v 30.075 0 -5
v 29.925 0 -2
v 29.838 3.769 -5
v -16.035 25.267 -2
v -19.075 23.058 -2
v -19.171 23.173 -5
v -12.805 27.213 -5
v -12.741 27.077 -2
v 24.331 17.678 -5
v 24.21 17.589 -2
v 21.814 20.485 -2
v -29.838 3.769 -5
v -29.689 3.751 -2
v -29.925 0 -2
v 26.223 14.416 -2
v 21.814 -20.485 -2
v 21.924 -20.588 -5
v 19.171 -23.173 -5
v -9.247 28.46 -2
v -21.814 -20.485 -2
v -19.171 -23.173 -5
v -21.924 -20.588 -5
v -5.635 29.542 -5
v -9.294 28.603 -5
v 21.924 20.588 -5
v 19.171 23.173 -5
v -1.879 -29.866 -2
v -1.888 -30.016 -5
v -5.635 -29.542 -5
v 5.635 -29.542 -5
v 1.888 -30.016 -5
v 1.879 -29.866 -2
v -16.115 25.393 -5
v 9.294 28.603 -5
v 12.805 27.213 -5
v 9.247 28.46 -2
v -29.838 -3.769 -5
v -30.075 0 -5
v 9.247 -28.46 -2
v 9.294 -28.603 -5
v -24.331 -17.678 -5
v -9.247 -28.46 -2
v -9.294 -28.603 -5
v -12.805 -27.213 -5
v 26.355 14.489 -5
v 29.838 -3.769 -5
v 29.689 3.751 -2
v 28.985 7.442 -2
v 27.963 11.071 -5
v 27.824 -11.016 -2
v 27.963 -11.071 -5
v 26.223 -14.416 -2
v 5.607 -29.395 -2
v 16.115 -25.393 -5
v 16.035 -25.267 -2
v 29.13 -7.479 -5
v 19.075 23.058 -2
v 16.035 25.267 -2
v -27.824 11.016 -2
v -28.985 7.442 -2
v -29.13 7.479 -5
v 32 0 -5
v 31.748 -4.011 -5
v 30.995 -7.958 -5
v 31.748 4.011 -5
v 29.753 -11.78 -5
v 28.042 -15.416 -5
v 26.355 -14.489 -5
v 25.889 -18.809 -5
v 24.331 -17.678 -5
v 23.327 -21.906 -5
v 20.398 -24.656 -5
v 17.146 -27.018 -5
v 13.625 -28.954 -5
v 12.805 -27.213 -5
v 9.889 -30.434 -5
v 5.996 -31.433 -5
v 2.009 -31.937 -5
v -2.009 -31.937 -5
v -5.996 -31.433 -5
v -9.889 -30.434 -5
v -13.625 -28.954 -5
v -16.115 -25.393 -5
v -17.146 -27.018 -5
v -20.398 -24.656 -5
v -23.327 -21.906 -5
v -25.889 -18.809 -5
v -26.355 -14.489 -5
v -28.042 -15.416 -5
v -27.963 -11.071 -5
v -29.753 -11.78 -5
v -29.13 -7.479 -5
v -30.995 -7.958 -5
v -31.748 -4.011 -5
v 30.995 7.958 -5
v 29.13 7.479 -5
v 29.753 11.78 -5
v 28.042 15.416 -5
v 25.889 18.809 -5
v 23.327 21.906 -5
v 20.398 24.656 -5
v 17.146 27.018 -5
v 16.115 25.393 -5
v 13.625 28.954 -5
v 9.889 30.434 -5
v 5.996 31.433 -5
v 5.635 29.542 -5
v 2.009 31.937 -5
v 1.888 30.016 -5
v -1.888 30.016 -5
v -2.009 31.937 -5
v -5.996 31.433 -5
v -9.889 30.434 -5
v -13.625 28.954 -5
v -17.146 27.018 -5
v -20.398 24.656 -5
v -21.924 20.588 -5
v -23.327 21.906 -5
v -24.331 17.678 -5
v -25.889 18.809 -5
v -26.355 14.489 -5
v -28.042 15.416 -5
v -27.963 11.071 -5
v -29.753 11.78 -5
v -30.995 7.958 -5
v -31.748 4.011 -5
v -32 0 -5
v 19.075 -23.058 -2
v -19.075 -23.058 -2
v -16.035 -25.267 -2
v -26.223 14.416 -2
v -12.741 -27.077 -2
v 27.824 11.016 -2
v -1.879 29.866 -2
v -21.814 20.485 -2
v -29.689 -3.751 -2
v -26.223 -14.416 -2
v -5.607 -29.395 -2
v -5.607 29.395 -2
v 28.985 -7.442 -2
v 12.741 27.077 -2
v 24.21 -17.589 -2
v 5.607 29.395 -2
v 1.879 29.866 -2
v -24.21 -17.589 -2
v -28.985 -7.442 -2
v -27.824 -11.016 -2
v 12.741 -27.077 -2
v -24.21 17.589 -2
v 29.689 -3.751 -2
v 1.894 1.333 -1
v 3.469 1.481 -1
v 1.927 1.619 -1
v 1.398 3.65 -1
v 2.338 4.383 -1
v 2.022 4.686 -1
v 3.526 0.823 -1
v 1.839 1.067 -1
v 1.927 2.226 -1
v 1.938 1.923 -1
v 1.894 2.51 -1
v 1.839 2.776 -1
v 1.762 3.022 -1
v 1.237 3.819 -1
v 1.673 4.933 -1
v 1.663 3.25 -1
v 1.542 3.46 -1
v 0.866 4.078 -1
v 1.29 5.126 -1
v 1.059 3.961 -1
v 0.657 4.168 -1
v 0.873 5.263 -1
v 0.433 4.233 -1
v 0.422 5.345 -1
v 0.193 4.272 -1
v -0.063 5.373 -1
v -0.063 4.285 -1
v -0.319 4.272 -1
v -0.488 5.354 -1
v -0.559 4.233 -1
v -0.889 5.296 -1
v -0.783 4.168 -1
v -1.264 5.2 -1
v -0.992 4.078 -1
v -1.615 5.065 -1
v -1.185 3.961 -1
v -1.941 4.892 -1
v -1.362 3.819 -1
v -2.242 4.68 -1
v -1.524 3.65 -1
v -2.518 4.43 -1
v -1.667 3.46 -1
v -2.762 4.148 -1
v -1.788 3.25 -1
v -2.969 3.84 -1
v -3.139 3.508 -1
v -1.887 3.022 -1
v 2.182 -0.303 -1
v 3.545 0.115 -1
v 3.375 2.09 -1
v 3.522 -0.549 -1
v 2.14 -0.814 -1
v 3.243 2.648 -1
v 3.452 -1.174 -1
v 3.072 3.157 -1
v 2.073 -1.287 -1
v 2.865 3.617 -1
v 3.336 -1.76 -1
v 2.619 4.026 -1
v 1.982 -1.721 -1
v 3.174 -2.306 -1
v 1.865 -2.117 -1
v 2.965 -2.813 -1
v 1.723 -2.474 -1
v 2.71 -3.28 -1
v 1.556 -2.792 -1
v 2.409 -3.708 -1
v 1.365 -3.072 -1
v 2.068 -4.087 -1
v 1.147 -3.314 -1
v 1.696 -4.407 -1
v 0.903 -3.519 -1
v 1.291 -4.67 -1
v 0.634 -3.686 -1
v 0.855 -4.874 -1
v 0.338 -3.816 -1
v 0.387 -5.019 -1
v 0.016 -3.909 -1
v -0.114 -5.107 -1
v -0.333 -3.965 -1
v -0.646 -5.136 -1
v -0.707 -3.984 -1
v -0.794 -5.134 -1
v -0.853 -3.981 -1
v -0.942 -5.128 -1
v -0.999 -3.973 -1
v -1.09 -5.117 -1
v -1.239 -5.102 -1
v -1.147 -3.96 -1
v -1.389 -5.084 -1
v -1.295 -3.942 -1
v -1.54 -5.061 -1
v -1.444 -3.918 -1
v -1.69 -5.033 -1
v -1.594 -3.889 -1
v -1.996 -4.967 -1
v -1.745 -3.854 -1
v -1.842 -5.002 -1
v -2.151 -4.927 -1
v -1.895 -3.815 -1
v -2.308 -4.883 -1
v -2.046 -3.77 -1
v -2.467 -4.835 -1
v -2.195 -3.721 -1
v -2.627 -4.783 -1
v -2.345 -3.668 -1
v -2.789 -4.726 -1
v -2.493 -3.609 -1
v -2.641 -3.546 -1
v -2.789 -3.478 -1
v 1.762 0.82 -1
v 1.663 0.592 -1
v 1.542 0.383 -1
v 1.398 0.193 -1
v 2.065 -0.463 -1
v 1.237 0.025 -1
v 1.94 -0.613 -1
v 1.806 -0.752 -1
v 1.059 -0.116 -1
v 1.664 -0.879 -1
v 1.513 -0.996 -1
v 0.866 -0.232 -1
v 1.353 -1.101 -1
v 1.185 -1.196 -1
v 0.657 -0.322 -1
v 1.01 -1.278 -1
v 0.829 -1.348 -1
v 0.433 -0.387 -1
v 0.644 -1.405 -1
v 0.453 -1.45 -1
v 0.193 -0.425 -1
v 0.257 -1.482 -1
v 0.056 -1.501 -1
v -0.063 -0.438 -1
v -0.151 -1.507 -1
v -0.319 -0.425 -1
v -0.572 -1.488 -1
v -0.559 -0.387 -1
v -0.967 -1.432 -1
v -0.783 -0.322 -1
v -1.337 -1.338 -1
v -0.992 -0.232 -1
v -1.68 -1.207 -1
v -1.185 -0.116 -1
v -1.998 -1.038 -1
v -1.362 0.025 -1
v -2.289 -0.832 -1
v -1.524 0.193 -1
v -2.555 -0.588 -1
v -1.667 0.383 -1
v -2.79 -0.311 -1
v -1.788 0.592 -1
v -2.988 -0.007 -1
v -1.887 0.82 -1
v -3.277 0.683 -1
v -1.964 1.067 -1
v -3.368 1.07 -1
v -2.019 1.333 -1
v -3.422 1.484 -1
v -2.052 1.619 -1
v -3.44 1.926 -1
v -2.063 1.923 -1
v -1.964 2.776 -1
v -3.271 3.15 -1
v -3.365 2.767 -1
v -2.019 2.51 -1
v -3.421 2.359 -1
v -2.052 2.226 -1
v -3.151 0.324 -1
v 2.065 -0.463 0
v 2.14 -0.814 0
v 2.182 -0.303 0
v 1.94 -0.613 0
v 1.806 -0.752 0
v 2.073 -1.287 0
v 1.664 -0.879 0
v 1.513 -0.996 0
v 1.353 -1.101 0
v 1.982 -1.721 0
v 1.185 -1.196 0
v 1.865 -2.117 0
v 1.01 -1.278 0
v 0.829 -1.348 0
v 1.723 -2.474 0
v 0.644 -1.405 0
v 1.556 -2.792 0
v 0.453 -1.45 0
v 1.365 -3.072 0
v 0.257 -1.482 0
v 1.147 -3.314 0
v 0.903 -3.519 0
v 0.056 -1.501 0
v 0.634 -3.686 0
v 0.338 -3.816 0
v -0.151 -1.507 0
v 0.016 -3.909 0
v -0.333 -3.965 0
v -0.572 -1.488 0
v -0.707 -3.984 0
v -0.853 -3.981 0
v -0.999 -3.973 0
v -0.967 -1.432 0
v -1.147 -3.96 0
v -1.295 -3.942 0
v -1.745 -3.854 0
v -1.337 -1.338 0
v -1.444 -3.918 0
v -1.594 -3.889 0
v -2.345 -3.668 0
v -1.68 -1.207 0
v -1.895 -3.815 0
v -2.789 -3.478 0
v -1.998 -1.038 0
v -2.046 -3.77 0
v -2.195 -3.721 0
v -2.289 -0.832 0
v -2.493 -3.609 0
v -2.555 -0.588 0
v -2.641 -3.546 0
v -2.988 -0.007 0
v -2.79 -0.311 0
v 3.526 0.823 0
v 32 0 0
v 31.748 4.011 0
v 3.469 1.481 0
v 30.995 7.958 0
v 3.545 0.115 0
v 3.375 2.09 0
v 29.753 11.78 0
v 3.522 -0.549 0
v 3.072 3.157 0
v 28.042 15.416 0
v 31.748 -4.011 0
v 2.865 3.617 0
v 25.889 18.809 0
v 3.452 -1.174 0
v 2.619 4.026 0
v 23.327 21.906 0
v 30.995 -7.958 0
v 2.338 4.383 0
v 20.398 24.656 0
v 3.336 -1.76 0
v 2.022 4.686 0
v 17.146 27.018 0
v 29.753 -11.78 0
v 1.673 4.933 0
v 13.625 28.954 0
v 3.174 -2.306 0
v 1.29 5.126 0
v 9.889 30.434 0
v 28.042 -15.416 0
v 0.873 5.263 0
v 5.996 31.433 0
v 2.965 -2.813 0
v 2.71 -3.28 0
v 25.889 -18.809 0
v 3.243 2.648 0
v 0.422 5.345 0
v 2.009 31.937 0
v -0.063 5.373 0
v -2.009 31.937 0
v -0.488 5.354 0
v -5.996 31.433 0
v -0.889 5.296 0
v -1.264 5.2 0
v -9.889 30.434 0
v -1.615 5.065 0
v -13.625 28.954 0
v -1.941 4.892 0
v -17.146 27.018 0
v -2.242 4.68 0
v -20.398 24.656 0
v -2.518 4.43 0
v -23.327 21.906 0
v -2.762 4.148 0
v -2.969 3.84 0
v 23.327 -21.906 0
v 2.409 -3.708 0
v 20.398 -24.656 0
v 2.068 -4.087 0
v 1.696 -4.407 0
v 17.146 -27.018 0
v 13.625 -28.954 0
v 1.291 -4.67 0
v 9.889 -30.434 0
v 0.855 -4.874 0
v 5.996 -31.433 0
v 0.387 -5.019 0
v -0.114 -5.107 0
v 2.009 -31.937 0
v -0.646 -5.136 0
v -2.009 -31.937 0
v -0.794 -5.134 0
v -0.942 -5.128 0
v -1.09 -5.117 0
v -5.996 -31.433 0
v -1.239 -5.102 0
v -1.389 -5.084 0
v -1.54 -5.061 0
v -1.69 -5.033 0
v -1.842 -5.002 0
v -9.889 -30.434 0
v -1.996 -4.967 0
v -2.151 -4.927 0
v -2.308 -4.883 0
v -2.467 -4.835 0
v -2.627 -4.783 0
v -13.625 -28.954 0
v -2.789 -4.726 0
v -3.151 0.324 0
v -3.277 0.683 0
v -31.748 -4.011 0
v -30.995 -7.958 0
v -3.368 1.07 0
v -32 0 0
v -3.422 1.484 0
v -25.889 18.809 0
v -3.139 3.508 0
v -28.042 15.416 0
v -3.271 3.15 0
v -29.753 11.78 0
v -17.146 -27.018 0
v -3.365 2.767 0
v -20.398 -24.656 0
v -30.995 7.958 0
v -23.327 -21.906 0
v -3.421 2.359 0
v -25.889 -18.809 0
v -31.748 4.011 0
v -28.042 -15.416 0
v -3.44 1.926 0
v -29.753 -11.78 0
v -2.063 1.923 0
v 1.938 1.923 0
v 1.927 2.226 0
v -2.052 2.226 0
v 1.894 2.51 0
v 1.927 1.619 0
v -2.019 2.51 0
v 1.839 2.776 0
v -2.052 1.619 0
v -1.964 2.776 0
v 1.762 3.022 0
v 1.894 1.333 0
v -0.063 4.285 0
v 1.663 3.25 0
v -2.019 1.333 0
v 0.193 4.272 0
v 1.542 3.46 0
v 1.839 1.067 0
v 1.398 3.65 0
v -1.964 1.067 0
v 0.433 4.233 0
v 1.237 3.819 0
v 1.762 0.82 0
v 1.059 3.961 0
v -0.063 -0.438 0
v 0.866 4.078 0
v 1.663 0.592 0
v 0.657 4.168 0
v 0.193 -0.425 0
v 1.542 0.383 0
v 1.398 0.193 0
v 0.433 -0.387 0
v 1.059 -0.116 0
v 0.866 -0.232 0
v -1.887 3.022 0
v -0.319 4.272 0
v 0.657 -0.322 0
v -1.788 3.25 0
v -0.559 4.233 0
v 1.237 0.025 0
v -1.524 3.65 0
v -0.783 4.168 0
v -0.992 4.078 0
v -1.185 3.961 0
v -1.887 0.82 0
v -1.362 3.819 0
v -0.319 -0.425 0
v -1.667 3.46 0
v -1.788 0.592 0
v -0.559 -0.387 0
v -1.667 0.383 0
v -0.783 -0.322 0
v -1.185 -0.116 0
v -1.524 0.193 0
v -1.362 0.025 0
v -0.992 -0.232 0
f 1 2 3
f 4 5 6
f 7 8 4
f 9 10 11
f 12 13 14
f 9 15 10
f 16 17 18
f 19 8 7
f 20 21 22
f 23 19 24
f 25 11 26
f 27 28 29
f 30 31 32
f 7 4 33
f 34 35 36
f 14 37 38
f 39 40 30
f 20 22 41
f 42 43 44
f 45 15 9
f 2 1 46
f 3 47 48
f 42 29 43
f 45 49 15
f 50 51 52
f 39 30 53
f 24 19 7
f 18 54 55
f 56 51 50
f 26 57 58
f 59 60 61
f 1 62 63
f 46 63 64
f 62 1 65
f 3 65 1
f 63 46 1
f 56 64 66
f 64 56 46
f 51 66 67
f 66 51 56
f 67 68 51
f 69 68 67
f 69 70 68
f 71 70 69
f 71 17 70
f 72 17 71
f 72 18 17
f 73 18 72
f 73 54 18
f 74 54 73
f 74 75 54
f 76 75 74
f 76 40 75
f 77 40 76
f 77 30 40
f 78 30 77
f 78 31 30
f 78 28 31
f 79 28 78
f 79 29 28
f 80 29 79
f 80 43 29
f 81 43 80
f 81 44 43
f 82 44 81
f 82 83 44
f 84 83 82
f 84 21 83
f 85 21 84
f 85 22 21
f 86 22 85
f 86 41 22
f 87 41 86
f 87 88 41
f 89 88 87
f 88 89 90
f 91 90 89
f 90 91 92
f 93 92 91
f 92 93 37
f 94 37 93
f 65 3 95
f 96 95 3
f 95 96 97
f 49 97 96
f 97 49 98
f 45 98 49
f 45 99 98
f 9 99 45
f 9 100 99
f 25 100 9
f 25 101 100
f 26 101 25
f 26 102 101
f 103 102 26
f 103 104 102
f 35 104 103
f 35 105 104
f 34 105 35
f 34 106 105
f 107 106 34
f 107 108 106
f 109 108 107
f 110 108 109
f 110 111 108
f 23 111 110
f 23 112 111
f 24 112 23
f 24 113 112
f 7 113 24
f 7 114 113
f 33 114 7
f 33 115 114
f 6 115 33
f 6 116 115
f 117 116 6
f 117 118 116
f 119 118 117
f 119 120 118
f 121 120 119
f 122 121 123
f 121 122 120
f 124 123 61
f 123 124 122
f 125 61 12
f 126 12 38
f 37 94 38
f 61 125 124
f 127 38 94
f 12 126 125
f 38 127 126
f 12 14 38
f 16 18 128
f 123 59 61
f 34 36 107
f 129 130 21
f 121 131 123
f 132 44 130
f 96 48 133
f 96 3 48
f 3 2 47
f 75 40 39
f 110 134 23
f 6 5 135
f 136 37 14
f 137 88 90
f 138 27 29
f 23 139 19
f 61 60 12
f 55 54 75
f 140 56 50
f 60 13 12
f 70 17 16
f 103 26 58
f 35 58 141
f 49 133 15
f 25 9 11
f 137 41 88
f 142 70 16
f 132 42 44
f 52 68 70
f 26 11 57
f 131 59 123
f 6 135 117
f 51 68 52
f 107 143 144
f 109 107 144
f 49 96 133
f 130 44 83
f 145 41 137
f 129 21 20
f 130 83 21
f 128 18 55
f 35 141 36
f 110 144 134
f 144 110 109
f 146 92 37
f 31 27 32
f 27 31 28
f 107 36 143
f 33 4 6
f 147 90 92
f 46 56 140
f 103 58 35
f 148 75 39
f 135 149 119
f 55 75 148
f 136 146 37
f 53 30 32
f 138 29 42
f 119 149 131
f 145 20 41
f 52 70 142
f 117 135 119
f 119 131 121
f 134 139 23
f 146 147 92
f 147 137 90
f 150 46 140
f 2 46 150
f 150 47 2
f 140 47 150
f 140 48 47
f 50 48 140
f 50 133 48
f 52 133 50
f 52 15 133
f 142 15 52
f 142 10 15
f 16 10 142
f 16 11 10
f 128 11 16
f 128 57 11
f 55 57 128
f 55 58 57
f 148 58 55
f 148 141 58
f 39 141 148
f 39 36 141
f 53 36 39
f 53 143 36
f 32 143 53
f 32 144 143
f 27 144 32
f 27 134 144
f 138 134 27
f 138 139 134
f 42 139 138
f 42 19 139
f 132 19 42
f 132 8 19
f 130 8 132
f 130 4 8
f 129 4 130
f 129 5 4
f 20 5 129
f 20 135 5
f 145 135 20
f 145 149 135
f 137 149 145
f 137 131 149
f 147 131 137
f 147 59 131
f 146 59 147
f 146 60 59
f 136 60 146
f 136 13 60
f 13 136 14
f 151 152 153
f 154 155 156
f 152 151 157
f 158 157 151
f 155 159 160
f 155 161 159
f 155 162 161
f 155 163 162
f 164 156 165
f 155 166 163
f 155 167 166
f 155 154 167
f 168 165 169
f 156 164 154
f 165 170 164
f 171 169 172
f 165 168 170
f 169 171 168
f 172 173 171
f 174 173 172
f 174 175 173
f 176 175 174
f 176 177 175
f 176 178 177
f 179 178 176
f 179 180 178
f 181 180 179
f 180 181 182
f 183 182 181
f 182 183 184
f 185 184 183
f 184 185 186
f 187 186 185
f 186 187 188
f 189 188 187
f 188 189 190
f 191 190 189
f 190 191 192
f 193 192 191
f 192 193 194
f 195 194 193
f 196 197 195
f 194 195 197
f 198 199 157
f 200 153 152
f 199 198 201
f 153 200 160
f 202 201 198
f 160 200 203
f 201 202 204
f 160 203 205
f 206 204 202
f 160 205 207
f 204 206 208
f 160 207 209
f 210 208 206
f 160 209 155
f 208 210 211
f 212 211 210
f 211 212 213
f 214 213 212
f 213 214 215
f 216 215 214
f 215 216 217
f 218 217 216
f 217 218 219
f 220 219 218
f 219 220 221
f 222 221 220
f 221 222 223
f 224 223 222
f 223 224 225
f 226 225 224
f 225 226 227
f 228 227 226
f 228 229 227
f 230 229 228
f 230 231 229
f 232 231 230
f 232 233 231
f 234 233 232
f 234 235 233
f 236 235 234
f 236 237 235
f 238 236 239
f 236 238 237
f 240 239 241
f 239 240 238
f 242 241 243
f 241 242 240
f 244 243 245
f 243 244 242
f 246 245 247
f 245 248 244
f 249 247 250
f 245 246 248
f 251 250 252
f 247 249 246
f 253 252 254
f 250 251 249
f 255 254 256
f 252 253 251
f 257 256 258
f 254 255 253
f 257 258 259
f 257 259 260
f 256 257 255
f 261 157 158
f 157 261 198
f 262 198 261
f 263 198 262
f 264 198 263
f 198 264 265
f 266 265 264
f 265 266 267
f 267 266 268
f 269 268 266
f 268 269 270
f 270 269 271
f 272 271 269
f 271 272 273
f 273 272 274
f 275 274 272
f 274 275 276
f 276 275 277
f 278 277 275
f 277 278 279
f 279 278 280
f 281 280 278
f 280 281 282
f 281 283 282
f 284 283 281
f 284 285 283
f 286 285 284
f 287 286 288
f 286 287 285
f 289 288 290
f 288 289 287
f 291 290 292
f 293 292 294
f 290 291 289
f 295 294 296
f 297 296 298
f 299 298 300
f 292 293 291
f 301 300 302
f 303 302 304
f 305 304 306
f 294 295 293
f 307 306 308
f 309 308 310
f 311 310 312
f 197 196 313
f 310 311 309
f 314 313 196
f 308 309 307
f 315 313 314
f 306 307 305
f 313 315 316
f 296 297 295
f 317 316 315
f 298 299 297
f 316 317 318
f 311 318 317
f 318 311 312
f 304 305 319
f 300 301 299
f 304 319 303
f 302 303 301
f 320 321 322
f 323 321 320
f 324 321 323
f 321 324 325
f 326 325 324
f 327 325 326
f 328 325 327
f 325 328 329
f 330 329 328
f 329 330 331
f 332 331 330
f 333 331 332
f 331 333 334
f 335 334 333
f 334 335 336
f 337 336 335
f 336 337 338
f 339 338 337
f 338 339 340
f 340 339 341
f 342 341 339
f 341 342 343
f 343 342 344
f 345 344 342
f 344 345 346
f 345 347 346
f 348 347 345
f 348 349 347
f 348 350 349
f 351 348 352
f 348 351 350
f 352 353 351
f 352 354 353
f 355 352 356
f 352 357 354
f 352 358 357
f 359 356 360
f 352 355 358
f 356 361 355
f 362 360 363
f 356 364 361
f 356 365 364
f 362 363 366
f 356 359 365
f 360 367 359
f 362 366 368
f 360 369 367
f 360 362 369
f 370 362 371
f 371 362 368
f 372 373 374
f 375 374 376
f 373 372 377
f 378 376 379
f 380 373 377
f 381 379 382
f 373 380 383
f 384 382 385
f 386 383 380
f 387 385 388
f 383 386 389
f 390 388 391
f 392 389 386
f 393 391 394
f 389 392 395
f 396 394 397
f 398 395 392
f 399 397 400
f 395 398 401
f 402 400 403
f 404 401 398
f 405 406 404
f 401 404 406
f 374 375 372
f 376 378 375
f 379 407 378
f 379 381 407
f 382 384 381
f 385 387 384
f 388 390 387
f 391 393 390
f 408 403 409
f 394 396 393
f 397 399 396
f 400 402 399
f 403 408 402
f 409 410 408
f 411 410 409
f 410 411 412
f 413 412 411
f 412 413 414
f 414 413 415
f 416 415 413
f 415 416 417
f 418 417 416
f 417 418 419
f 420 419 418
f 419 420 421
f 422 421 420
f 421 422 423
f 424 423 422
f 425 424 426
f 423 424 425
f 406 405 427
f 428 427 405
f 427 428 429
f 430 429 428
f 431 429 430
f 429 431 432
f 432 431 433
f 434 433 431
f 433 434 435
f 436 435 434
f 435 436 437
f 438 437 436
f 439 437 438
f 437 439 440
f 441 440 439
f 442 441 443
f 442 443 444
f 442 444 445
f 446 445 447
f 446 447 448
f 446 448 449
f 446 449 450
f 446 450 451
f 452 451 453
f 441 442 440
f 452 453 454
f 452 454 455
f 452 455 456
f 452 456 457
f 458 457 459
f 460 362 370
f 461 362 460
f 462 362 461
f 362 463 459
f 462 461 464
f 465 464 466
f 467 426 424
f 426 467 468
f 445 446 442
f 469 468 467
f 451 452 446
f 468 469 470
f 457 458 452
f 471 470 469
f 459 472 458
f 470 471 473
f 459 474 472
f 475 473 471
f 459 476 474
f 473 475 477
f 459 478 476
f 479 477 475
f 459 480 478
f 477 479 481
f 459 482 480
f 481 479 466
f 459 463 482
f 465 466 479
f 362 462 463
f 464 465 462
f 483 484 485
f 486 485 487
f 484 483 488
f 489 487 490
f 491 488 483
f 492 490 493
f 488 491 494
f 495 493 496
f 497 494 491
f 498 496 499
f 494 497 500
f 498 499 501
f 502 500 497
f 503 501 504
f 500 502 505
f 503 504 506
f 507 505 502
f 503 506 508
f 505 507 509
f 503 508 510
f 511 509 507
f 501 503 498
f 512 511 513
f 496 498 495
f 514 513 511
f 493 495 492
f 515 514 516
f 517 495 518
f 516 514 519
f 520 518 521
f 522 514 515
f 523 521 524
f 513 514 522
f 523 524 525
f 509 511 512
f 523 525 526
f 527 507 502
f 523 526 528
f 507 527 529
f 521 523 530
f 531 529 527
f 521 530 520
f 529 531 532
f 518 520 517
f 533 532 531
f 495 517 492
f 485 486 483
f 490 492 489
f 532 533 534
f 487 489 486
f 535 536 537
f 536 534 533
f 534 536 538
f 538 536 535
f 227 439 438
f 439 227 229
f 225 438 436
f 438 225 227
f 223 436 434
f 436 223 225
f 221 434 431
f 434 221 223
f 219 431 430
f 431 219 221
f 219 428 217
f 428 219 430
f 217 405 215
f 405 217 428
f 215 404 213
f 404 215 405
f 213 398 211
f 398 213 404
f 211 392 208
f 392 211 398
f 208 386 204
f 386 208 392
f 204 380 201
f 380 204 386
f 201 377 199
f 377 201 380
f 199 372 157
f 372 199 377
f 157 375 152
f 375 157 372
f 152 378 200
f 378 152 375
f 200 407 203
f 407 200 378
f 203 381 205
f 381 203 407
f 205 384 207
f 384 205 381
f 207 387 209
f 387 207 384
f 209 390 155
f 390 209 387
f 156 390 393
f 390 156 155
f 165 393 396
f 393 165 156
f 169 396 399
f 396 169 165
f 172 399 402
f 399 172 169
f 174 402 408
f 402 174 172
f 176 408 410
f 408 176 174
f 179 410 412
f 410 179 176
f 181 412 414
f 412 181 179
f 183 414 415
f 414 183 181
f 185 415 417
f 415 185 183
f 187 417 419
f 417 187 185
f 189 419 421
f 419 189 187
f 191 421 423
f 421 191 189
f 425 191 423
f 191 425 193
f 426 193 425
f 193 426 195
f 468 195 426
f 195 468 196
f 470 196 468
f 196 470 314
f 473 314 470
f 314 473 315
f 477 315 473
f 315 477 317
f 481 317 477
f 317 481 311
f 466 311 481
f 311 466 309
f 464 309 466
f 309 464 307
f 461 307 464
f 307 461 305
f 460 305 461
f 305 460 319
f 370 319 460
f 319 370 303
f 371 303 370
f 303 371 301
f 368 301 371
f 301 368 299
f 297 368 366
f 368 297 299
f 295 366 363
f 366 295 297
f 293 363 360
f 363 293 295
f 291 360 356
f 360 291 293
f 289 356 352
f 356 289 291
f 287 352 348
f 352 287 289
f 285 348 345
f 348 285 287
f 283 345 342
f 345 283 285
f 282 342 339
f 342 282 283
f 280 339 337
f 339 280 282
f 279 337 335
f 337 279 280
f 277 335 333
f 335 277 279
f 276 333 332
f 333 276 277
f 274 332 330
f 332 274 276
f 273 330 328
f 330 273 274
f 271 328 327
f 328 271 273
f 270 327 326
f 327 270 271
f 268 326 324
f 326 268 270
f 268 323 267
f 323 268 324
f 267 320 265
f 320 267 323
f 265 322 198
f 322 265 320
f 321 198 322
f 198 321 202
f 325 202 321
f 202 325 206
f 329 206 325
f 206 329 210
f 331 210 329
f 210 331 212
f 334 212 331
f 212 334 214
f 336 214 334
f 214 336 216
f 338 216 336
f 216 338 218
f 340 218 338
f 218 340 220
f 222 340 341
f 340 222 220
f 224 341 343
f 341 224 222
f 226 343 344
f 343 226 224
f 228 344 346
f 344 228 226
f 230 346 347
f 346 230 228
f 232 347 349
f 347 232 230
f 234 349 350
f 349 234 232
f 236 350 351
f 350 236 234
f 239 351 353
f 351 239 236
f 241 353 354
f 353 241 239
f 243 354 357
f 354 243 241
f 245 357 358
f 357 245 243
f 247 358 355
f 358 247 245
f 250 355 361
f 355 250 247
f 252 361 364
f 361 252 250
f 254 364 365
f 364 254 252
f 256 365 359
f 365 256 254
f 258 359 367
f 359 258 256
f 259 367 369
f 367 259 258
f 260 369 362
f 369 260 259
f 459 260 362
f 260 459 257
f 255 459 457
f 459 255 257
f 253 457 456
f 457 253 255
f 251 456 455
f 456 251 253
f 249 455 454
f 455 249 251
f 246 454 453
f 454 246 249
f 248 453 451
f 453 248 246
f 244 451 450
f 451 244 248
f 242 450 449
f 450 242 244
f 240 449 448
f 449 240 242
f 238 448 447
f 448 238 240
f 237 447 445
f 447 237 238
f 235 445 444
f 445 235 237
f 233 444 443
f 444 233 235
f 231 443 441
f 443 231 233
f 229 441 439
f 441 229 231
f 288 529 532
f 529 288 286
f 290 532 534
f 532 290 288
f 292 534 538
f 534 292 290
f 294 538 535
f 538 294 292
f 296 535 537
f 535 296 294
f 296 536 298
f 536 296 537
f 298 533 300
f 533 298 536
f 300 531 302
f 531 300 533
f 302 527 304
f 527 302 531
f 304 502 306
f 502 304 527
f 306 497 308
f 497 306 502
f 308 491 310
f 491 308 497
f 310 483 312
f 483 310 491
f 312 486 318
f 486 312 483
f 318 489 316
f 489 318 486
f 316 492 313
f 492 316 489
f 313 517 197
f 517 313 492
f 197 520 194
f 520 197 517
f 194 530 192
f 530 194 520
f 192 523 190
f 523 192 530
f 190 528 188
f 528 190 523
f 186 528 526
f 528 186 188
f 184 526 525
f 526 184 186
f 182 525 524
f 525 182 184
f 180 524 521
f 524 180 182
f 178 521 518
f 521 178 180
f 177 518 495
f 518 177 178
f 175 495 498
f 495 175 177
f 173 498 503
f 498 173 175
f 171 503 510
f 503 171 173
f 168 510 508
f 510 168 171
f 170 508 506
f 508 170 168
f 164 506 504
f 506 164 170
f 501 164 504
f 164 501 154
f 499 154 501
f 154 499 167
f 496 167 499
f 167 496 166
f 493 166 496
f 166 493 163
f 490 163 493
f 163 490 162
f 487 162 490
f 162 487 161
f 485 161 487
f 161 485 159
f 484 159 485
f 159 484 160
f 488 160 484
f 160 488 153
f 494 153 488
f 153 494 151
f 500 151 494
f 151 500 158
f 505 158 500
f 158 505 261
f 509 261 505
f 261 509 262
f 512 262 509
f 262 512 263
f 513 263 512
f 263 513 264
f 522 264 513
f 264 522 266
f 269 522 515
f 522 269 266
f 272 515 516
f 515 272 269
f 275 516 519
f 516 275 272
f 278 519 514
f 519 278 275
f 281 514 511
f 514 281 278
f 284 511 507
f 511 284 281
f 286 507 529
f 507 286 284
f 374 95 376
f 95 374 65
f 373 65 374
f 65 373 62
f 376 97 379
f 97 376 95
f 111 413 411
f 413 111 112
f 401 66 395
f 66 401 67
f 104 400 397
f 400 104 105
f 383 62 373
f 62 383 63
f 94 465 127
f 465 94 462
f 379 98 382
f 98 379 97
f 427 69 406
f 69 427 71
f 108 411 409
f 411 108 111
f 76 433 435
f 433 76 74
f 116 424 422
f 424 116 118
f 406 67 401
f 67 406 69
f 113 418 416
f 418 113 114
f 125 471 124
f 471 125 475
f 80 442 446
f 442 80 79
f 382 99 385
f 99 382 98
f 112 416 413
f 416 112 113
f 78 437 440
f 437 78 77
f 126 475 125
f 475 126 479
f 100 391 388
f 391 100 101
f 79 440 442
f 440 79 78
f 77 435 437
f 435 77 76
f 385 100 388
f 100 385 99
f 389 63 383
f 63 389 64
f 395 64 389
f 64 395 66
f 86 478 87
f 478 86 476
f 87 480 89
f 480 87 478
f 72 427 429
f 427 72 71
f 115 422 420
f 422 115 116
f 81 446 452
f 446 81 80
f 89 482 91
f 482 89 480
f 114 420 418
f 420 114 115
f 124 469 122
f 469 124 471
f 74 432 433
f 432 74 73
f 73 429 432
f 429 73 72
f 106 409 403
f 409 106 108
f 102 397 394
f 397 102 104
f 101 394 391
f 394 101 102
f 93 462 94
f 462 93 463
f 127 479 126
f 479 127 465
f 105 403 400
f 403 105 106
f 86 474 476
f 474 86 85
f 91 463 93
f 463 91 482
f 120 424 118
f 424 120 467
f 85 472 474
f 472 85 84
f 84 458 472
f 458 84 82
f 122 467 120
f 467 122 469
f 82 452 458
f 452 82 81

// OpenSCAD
$fn = 50;

difference() {
	union() {
		translate(v = [0, 0, -5.0]) {
			cylinder(h = 5, r = 32.0);
		}
	}
	union() {
		#translate(v = [0, 0, -5.0]) {
			cylinder(h = 3, r1 = 30.075, r2 = 29.925);
		}
		translate(v = [0, 0, -1]) {
			linear_extrude(height = 1) {
				text(font = "Impact", halign = "center", size = 10, text = "9", valign = "center");
			}
		}
	}
}
